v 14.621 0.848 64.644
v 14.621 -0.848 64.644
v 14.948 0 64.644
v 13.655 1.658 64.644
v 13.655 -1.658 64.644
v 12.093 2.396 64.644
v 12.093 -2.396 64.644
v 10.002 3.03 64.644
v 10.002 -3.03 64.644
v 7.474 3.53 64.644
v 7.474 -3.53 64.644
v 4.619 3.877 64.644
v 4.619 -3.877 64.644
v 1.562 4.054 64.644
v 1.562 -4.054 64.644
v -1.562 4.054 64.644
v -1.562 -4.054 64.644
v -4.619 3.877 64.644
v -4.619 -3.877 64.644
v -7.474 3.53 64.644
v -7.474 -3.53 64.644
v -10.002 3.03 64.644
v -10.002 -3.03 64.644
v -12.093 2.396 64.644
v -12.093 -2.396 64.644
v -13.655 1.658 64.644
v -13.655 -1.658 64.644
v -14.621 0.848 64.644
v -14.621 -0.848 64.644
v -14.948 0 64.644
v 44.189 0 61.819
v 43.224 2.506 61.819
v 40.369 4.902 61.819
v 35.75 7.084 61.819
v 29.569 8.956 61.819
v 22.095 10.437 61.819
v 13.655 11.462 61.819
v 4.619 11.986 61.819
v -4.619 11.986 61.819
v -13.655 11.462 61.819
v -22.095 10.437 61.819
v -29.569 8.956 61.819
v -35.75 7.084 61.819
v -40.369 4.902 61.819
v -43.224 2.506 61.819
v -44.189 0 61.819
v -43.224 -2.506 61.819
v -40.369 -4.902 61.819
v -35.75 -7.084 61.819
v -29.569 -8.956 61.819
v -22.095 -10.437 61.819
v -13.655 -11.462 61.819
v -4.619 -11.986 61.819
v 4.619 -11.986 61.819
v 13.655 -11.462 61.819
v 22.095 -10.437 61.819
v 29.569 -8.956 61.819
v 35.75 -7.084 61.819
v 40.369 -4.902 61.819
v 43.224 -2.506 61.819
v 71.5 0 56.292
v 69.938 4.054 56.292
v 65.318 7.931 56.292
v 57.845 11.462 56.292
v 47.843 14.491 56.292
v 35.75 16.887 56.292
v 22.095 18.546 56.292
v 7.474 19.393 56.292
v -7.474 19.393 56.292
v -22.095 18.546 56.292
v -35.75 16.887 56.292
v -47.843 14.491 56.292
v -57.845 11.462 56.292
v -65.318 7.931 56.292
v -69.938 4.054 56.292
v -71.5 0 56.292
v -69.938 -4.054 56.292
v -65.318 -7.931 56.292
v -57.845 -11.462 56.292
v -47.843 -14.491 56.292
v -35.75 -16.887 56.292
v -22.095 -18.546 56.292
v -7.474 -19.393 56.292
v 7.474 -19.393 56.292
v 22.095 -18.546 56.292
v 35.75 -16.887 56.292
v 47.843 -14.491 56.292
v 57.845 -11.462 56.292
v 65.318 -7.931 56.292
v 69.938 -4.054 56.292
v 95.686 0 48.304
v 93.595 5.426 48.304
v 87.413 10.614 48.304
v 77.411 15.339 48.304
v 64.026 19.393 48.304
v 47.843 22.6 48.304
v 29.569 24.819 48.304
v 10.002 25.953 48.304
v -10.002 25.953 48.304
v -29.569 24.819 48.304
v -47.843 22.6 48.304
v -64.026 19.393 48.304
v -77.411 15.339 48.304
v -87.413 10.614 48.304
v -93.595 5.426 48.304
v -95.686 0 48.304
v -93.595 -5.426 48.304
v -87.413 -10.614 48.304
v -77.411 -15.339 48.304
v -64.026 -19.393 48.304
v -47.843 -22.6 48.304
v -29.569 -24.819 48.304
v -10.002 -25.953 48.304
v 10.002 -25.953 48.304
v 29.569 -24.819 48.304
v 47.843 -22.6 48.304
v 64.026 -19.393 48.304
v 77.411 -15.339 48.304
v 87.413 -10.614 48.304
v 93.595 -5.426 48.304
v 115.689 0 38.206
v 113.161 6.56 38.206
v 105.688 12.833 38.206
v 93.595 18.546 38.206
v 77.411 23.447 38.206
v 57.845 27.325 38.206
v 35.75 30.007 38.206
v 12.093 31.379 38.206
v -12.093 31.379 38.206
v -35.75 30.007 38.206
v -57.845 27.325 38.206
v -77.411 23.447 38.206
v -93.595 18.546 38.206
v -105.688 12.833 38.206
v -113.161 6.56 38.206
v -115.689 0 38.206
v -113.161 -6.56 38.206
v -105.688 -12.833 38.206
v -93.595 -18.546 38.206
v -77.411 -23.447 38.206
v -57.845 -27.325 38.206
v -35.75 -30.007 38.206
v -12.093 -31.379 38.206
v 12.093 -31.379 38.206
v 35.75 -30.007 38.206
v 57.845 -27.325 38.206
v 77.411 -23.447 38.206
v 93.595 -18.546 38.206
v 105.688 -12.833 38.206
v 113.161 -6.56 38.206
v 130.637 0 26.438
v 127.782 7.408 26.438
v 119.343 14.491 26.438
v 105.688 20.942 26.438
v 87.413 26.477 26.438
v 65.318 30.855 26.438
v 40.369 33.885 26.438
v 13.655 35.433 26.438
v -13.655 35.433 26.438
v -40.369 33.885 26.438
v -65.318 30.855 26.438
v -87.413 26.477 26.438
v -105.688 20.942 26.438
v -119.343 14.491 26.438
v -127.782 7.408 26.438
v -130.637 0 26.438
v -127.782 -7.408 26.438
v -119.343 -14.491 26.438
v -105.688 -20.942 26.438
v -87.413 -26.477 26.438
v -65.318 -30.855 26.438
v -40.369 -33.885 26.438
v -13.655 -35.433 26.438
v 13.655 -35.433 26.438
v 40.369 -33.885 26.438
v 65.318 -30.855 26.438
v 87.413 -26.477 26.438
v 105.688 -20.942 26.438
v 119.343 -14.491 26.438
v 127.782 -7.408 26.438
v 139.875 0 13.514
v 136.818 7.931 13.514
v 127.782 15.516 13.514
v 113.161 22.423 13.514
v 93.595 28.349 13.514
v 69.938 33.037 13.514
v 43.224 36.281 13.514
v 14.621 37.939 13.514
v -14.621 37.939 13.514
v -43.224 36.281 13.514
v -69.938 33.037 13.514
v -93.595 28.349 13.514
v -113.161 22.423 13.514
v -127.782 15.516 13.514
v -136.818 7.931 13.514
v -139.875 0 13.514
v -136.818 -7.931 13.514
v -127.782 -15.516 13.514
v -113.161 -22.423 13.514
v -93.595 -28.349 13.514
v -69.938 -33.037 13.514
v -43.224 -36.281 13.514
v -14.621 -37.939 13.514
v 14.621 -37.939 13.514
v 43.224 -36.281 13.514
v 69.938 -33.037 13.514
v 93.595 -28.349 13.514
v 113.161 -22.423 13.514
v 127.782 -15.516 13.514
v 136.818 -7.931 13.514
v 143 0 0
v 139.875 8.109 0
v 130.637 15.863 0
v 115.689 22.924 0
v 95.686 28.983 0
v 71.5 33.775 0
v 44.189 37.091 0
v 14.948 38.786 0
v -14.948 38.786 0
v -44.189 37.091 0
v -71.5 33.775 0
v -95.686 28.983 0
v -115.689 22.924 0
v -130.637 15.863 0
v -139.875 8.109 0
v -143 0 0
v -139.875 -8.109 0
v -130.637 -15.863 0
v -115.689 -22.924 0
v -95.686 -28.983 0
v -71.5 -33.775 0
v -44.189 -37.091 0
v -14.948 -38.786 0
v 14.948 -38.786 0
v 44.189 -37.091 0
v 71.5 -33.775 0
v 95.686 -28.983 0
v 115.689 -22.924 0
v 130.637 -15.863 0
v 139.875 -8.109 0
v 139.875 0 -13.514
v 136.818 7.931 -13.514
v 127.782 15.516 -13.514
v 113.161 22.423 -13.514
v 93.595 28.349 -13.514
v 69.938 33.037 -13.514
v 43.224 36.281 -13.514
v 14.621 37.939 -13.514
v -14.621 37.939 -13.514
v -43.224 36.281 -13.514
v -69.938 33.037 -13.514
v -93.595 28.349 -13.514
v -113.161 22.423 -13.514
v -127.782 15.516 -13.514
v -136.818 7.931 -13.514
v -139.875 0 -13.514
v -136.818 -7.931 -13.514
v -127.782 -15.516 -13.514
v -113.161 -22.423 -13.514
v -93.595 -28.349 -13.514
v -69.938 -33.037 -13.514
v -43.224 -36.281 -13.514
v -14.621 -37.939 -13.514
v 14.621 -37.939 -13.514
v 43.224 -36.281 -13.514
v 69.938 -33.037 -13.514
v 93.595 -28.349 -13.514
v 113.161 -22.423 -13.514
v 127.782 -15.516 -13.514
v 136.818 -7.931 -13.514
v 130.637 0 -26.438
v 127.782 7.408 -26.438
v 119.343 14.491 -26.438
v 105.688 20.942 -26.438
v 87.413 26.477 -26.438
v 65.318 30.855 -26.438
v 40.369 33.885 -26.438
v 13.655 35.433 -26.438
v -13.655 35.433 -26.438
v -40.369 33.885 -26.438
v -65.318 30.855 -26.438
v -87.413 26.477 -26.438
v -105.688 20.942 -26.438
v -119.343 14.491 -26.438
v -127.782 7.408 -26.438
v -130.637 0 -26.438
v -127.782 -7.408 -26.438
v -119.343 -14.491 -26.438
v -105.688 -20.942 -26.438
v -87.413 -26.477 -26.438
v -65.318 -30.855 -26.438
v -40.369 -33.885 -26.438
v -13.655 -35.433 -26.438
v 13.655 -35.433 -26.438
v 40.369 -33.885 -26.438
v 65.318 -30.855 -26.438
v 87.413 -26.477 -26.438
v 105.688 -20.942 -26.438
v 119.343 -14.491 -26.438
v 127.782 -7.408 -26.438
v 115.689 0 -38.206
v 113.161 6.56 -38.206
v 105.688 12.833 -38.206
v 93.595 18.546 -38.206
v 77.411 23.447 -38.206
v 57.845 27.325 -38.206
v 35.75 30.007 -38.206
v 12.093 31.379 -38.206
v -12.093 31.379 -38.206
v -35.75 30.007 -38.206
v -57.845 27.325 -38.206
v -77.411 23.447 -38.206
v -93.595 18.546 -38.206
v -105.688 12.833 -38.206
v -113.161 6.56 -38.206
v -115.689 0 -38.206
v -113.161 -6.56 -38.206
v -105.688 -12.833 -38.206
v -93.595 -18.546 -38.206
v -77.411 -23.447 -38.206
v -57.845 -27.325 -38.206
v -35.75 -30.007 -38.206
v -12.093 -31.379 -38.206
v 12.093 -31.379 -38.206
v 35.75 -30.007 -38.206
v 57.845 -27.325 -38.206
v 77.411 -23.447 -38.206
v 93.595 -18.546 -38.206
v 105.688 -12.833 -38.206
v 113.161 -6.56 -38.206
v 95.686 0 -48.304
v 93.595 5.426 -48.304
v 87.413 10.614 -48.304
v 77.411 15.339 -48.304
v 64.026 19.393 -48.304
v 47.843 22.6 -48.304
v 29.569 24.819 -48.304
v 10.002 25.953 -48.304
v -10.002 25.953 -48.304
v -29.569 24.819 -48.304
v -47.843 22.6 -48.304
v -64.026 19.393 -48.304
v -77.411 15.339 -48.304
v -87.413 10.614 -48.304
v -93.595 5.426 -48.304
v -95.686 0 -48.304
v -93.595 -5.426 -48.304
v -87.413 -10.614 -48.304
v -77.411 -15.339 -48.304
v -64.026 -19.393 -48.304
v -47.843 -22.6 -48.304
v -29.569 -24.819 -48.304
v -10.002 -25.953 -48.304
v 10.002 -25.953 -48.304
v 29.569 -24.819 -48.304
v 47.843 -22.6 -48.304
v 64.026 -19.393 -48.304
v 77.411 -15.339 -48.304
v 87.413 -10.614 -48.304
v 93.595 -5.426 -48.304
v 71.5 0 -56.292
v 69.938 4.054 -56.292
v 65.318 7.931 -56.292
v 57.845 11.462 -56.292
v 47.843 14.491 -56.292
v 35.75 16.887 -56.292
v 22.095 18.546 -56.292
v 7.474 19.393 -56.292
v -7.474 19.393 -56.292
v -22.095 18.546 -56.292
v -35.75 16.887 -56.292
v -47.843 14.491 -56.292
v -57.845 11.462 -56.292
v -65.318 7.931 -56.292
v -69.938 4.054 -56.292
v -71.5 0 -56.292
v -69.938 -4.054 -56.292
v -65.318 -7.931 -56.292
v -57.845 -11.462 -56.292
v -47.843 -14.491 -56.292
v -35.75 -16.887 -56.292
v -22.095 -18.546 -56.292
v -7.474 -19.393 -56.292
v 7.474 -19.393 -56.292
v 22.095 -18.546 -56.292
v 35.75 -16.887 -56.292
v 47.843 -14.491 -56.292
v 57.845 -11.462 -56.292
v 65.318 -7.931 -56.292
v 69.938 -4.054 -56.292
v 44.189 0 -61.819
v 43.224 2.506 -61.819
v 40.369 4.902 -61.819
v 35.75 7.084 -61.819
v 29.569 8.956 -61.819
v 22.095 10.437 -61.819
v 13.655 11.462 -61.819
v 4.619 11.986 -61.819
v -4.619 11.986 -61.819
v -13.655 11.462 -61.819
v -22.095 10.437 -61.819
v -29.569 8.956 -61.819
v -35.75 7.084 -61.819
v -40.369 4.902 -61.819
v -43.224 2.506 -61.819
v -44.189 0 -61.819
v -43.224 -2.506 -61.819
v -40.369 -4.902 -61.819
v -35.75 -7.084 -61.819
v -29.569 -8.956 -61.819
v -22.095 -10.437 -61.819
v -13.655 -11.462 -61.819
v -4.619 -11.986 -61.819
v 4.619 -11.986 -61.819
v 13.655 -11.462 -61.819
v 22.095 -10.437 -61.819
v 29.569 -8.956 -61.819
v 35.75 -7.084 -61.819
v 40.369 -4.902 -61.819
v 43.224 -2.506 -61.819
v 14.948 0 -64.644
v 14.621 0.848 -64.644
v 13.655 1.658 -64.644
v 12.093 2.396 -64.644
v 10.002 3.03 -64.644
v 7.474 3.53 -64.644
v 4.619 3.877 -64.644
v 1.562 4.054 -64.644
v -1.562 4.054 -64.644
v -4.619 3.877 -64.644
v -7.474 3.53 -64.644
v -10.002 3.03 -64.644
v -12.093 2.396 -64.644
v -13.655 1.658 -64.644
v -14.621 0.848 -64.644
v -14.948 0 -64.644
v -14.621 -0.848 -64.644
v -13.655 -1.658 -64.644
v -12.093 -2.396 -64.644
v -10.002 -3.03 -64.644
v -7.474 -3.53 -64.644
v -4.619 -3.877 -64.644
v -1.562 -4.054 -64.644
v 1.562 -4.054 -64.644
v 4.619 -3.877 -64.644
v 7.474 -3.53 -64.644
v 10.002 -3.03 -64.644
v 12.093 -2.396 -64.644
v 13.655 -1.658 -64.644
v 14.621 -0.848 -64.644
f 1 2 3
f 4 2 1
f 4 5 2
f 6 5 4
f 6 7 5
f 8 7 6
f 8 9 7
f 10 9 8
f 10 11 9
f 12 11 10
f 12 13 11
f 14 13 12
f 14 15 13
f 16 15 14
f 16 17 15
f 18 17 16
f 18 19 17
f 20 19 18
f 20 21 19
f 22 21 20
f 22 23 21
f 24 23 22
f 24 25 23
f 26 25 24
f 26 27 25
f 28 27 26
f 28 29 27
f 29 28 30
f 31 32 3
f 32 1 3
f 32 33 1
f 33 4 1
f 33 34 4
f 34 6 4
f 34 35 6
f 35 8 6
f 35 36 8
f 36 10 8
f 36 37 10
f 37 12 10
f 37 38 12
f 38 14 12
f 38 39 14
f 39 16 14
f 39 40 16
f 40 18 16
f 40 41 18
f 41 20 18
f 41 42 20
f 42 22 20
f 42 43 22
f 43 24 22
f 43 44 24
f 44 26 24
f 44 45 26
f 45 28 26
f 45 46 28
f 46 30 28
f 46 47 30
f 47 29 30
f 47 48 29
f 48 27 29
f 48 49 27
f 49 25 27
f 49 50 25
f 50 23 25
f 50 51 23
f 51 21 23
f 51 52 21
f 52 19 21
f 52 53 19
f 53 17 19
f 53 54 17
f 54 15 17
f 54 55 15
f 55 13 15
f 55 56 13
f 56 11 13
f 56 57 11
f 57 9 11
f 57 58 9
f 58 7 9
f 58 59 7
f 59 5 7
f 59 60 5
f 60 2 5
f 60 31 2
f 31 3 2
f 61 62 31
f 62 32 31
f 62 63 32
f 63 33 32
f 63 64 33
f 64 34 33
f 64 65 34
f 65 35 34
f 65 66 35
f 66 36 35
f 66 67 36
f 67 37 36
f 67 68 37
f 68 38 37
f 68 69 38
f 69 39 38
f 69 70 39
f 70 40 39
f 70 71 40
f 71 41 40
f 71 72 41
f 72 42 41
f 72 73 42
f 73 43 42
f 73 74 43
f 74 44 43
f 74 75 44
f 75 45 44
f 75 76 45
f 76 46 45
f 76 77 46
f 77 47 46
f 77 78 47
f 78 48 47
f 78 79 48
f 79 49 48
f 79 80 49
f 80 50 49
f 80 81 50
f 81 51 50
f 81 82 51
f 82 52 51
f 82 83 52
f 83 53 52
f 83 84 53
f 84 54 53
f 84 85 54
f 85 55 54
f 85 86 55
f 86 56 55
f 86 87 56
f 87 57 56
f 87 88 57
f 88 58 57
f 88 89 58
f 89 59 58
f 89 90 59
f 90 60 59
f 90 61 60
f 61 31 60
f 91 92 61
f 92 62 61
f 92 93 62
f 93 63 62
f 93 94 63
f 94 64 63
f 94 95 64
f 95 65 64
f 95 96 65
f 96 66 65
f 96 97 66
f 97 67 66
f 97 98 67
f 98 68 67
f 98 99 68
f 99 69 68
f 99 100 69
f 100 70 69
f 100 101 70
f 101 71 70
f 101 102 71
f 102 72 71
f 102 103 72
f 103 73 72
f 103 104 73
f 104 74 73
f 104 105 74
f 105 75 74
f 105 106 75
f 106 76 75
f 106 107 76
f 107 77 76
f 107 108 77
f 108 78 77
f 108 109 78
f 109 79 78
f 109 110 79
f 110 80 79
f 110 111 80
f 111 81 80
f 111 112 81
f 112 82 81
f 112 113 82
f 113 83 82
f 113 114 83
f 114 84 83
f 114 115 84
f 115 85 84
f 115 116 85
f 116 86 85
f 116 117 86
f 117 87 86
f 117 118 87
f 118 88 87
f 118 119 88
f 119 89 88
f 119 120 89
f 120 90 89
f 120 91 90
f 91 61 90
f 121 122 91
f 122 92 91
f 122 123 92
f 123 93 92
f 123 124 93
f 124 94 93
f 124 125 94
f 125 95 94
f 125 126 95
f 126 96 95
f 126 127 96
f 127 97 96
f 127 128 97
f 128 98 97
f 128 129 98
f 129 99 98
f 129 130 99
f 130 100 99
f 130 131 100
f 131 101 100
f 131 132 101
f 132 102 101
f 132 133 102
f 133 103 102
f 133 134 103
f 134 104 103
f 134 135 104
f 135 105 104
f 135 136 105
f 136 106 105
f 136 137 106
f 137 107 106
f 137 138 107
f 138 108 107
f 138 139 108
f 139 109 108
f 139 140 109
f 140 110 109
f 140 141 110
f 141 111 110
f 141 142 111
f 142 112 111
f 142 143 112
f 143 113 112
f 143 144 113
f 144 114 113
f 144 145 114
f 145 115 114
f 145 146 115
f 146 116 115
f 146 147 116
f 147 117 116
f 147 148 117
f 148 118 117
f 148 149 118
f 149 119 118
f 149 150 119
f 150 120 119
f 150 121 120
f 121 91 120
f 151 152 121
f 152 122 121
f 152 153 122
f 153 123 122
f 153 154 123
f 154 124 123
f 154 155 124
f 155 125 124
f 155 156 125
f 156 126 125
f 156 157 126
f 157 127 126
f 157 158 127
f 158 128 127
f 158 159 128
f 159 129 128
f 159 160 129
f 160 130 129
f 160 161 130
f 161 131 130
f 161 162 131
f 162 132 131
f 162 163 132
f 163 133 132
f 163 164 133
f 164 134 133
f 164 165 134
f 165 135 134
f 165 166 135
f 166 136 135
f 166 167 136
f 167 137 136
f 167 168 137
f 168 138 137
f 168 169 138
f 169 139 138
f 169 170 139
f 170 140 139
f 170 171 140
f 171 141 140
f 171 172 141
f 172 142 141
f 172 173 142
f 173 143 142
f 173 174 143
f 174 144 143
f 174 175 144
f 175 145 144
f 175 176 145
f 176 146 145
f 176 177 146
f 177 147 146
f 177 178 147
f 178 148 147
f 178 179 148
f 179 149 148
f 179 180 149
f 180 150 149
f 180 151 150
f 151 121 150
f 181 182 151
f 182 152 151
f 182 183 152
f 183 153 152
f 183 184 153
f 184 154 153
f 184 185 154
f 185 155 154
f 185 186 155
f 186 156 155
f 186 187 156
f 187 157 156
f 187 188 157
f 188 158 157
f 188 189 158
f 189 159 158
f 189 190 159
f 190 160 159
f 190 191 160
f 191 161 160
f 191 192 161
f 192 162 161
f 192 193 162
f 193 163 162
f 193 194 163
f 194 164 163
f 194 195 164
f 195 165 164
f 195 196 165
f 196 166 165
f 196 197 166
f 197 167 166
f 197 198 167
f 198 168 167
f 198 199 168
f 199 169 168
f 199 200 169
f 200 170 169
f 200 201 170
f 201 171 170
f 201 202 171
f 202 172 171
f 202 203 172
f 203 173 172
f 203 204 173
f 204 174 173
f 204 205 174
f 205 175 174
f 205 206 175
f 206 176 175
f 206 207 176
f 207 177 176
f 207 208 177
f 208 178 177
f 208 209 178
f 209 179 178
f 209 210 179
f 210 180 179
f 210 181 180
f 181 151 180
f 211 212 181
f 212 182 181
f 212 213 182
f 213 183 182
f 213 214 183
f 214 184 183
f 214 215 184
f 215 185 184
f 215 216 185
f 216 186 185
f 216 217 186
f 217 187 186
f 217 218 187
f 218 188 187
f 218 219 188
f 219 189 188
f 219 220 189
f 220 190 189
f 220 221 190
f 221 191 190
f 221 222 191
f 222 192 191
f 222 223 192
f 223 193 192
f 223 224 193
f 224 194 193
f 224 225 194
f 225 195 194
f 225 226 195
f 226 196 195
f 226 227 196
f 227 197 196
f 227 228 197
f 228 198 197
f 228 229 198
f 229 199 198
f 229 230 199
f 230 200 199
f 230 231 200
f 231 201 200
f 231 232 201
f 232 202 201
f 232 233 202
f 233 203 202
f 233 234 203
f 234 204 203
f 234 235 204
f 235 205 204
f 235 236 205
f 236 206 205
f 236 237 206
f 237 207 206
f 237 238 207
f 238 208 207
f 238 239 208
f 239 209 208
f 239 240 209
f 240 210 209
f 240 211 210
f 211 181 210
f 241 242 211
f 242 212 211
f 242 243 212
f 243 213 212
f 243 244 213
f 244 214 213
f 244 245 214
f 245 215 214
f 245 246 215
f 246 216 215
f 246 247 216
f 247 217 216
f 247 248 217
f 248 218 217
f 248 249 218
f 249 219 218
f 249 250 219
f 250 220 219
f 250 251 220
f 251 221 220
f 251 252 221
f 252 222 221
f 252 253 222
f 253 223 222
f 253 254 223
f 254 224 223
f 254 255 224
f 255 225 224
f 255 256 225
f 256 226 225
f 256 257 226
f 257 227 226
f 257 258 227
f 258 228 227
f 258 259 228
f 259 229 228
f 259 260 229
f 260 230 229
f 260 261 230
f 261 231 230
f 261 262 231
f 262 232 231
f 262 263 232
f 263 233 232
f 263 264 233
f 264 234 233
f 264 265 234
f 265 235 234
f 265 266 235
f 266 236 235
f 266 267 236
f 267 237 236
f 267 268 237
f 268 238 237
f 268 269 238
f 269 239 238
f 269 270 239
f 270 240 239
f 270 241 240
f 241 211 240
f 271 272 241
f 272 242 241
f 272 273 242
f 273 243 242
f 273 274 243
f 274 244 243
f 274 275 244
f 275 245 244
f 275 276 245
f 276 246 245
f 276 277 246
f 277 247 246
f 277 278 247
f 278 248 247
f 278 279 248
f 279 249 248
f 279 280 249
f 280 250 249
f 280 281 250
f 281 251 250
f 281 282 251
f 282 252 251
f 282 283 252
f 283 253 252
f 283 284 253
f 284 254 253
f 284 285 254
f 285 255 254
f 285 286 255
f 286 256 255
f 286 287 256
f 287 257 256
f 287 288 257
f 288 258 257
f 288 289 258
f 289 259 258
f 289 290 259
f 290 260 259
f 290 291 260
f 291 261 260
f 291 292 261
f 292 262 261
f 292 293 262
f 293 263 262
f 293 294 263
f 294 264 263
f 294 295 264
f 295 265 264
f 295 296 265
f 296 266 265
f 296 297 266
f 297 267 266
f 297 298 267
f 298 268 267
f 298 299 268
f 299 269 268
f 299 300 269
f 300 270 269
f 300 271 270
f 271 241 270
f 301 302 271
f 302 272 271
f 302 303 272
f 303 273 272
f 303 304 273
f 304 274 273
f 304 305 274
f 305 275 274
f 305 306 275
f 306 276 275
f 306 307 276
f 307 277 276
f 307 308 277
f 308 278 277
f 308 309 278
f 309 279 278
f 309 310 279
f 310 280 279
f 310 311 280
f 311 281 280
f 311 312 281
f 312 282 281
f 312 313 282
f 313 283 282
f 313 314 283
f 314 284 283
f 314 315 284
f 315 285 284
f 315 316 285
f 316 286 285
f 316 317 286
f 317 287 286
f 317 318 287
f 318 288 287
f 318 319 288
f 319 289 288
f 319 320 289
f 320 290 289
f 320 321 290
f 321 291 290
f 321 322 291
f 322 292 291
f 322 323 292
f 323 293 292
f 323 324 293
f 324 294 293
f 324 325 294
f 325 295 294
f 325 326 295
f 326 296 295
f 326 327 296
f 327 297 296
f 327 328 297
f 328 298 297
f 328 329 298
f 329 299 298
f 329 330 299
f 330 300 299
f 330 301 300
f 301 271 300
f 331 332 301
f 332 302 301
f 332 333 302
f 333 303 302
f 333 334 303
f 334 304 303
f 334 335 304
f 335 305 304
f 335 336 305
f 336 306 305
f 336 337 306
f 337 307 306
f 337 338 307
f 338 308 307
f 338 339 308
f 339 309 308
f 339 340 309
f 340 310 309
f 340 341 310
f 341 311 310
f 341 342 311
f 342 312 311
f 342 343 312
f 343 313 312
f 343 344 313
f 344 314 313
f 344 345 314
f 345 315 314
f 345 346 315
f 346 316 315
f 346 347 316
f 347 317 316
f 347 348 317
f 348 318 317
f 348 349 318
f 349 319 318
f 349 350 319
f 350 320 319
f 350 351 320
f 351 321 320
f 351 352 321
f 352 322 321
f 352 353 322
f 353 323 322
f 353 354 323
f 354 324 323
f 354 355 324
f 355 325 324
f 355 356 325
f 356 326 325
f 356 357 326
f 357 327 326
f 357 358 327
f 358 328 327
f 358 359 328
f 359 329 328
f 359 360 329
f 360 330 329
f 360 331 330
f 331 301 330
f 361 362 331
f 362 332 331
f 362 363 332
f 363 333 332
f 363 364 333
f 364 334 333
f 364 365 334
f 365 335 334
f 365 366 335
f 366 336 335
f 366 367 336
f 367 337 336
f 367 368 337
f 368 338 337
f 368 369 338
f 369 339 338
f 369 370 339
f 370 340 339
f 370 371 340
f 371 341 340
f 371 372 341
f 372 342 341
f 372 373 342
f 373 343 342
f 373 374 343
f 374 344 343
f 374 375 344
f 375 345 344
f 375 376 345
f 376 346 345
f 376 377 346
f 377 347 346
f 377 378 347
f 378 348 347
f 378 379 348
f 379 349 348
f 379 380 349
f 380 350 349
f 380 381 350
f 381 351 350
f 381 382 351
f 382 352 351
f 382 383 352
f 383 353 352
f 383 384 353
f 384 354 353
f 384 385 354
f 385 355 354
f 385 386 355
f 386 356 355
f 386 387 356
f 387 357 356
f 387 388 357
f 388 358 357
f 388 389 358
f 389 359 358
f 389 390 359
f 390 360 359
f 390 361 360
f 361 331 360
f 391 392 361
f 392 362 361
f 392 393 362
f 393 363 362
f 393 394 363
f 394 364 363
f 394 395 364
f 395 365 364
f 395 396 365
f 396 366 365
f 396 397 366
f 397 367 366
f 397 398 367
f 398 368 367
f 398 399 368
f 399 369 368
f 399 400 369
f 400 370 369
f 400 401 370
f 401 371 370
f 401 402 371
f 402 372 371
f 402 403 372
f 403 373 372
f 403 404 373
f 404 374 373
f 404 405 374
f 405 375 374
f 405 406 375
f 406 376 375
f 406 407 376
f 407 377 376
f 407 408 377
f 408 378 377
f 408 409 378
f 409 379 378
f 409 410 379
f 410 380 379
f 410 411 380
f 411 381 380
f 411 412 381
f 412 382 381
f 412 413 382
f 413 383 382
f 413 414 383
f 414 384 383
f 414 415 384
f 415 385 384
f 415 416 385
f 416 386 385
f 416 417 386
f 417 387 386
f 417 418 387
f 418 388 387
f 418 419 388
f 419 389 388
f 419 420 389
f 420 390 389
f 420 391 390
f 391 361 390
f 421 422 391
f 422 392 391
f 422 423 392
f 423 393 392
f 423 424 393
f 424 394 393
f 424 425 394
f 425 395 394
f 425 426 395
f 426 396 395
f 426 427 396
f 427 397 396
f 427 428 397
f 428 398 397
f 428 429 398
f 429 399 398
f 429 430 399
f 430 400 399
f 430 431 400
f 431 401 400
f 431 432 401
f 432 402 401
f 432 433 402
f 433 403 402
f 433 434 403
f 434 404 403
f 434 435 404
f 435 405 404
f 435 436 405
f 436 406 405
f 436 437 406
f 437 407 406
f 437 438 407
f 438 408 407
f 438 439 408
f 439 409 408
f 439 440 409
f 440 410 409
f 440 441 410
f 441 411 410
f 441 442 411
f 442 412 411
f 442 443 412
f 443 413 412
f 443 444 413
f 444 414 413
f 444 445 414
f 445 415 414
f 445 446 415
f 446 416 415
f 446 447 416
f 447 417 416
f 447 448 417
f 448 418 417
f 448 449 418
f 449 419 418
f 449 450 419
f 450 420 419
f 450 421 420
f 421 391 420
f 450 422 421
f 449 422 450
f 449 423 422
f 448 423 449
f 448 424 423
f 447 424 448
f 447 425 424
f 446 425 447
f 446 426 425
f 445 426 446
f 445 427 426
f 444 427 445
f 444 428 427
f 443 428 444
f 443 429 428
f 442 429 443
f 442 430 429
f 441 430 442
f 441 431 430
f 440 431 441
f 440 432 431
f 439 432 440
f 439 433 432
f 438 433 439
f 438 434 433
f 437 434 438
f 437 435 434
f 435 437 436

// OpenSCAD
// Generated by SolidPython 1.0.1 on 2020-07-29 00:46:49


scale(v = [11, 3, 5]) {
	sphere(r = 13);
}
/***********************************************
*********      SolidPython code:      **********
************************************************
 
# import packages: SolidPython
from solid import *
from solid.utils import *
from itertools import chain, combinations, permutations


class Resize:

    def __init__(self, scad_file):
        self.scad_file = scad_file
        #self.scad_file = import_scad(scad_file)
        # cone/cylinder param:
        self.r1 = 0
        self.r2 = 0
        self.h = 0
        # rectangular prism param:
        self.w = 0
        self.l = 0
        # ellipse param:
        self.r = 0

    # import OpenScad code (file name corresponds to shape)


    # classify shape + parameters
    def assign(self, param1, param2, param3):
        if self.scad_file == 'cone.scad':
            self.r1 = param1
            self.r2 = param2
            self.h = param3
        elif self.scad_file == 'cylinder.scad':
            self.r1 = param1
            self.r2 = param2
            self.h = param3
        elif self.scad_file == 'rectangularPrism.scad':
            self.h = param1
            self.l = param2
            self.w = param3
        else:
            self.r = param1
            self.h = param2

    # resize parameters
    def iterate(self):
        x = range(3, 20, 2)
        i = 1
        if self.scad_file == 'cone.scad':
            tempList = list(permutations(x, 2))
            for temp in tempList:
                param1 = temp[0]
                param2 = temp[1]
                filepath = 'produced_scad_files/' + 'cone' + str(param1) + '_' + str(param2) + '_' + '.scad'
                scad_render_to_file(cylinder(h=param1, r1=param2, r2=0), filepath)

        elif self.scad_file == 'cylinder.scad':
            tempList = list(permutations(x, 3))
            for temp in tempList:
                param1 = temp[0]
                param2 = temp[1]
                filepath = 'produced_scad_files/' + 'cylinder' + str(param1) + '_' + str(param2) + '_' + '.scad'
                scad_render_to_file(cylinder(h=param1, r1=param2, r2=param2), filepath)

        elif self.scad_file == 'rectangularPrism.scad':
            tempList = list(permutations(x, 3))
            for temp in tempList:
                param1 = temp[0]
                param2 = temp[1]
                param3 = temp[2]
                filepath = 'produced_scad_files/' + 'rectangularPrism' + str(param1) + '_' + str(param2) + '_' + str(
                    param3) + '.scad'
                scad_render_to_file(cube(size=(param1, param2, param3)), filepath)

        elif self.scad_file == 'ellipse.scad':
            tempList = list(permutations(x, 4))
            for temp in tempList:
                param1 = temp[0]
                param2 = temp[1]
                param3 = temp[2]
                param4 = temp[3]
                filepath = 'produced_scad_files/' + 'ellipse' + str(param1) + '_' + str(param2) + '_' + str(param3) + '_' + str(param4) + '.scad'
                scad_render_to_file(scale([param1, param2, param3])(sphere(r=param4)), filepath)

    def render_to_scadfile(self):
        scad_render_to_file(scad, 'example.scad') 
 
************************************************/
